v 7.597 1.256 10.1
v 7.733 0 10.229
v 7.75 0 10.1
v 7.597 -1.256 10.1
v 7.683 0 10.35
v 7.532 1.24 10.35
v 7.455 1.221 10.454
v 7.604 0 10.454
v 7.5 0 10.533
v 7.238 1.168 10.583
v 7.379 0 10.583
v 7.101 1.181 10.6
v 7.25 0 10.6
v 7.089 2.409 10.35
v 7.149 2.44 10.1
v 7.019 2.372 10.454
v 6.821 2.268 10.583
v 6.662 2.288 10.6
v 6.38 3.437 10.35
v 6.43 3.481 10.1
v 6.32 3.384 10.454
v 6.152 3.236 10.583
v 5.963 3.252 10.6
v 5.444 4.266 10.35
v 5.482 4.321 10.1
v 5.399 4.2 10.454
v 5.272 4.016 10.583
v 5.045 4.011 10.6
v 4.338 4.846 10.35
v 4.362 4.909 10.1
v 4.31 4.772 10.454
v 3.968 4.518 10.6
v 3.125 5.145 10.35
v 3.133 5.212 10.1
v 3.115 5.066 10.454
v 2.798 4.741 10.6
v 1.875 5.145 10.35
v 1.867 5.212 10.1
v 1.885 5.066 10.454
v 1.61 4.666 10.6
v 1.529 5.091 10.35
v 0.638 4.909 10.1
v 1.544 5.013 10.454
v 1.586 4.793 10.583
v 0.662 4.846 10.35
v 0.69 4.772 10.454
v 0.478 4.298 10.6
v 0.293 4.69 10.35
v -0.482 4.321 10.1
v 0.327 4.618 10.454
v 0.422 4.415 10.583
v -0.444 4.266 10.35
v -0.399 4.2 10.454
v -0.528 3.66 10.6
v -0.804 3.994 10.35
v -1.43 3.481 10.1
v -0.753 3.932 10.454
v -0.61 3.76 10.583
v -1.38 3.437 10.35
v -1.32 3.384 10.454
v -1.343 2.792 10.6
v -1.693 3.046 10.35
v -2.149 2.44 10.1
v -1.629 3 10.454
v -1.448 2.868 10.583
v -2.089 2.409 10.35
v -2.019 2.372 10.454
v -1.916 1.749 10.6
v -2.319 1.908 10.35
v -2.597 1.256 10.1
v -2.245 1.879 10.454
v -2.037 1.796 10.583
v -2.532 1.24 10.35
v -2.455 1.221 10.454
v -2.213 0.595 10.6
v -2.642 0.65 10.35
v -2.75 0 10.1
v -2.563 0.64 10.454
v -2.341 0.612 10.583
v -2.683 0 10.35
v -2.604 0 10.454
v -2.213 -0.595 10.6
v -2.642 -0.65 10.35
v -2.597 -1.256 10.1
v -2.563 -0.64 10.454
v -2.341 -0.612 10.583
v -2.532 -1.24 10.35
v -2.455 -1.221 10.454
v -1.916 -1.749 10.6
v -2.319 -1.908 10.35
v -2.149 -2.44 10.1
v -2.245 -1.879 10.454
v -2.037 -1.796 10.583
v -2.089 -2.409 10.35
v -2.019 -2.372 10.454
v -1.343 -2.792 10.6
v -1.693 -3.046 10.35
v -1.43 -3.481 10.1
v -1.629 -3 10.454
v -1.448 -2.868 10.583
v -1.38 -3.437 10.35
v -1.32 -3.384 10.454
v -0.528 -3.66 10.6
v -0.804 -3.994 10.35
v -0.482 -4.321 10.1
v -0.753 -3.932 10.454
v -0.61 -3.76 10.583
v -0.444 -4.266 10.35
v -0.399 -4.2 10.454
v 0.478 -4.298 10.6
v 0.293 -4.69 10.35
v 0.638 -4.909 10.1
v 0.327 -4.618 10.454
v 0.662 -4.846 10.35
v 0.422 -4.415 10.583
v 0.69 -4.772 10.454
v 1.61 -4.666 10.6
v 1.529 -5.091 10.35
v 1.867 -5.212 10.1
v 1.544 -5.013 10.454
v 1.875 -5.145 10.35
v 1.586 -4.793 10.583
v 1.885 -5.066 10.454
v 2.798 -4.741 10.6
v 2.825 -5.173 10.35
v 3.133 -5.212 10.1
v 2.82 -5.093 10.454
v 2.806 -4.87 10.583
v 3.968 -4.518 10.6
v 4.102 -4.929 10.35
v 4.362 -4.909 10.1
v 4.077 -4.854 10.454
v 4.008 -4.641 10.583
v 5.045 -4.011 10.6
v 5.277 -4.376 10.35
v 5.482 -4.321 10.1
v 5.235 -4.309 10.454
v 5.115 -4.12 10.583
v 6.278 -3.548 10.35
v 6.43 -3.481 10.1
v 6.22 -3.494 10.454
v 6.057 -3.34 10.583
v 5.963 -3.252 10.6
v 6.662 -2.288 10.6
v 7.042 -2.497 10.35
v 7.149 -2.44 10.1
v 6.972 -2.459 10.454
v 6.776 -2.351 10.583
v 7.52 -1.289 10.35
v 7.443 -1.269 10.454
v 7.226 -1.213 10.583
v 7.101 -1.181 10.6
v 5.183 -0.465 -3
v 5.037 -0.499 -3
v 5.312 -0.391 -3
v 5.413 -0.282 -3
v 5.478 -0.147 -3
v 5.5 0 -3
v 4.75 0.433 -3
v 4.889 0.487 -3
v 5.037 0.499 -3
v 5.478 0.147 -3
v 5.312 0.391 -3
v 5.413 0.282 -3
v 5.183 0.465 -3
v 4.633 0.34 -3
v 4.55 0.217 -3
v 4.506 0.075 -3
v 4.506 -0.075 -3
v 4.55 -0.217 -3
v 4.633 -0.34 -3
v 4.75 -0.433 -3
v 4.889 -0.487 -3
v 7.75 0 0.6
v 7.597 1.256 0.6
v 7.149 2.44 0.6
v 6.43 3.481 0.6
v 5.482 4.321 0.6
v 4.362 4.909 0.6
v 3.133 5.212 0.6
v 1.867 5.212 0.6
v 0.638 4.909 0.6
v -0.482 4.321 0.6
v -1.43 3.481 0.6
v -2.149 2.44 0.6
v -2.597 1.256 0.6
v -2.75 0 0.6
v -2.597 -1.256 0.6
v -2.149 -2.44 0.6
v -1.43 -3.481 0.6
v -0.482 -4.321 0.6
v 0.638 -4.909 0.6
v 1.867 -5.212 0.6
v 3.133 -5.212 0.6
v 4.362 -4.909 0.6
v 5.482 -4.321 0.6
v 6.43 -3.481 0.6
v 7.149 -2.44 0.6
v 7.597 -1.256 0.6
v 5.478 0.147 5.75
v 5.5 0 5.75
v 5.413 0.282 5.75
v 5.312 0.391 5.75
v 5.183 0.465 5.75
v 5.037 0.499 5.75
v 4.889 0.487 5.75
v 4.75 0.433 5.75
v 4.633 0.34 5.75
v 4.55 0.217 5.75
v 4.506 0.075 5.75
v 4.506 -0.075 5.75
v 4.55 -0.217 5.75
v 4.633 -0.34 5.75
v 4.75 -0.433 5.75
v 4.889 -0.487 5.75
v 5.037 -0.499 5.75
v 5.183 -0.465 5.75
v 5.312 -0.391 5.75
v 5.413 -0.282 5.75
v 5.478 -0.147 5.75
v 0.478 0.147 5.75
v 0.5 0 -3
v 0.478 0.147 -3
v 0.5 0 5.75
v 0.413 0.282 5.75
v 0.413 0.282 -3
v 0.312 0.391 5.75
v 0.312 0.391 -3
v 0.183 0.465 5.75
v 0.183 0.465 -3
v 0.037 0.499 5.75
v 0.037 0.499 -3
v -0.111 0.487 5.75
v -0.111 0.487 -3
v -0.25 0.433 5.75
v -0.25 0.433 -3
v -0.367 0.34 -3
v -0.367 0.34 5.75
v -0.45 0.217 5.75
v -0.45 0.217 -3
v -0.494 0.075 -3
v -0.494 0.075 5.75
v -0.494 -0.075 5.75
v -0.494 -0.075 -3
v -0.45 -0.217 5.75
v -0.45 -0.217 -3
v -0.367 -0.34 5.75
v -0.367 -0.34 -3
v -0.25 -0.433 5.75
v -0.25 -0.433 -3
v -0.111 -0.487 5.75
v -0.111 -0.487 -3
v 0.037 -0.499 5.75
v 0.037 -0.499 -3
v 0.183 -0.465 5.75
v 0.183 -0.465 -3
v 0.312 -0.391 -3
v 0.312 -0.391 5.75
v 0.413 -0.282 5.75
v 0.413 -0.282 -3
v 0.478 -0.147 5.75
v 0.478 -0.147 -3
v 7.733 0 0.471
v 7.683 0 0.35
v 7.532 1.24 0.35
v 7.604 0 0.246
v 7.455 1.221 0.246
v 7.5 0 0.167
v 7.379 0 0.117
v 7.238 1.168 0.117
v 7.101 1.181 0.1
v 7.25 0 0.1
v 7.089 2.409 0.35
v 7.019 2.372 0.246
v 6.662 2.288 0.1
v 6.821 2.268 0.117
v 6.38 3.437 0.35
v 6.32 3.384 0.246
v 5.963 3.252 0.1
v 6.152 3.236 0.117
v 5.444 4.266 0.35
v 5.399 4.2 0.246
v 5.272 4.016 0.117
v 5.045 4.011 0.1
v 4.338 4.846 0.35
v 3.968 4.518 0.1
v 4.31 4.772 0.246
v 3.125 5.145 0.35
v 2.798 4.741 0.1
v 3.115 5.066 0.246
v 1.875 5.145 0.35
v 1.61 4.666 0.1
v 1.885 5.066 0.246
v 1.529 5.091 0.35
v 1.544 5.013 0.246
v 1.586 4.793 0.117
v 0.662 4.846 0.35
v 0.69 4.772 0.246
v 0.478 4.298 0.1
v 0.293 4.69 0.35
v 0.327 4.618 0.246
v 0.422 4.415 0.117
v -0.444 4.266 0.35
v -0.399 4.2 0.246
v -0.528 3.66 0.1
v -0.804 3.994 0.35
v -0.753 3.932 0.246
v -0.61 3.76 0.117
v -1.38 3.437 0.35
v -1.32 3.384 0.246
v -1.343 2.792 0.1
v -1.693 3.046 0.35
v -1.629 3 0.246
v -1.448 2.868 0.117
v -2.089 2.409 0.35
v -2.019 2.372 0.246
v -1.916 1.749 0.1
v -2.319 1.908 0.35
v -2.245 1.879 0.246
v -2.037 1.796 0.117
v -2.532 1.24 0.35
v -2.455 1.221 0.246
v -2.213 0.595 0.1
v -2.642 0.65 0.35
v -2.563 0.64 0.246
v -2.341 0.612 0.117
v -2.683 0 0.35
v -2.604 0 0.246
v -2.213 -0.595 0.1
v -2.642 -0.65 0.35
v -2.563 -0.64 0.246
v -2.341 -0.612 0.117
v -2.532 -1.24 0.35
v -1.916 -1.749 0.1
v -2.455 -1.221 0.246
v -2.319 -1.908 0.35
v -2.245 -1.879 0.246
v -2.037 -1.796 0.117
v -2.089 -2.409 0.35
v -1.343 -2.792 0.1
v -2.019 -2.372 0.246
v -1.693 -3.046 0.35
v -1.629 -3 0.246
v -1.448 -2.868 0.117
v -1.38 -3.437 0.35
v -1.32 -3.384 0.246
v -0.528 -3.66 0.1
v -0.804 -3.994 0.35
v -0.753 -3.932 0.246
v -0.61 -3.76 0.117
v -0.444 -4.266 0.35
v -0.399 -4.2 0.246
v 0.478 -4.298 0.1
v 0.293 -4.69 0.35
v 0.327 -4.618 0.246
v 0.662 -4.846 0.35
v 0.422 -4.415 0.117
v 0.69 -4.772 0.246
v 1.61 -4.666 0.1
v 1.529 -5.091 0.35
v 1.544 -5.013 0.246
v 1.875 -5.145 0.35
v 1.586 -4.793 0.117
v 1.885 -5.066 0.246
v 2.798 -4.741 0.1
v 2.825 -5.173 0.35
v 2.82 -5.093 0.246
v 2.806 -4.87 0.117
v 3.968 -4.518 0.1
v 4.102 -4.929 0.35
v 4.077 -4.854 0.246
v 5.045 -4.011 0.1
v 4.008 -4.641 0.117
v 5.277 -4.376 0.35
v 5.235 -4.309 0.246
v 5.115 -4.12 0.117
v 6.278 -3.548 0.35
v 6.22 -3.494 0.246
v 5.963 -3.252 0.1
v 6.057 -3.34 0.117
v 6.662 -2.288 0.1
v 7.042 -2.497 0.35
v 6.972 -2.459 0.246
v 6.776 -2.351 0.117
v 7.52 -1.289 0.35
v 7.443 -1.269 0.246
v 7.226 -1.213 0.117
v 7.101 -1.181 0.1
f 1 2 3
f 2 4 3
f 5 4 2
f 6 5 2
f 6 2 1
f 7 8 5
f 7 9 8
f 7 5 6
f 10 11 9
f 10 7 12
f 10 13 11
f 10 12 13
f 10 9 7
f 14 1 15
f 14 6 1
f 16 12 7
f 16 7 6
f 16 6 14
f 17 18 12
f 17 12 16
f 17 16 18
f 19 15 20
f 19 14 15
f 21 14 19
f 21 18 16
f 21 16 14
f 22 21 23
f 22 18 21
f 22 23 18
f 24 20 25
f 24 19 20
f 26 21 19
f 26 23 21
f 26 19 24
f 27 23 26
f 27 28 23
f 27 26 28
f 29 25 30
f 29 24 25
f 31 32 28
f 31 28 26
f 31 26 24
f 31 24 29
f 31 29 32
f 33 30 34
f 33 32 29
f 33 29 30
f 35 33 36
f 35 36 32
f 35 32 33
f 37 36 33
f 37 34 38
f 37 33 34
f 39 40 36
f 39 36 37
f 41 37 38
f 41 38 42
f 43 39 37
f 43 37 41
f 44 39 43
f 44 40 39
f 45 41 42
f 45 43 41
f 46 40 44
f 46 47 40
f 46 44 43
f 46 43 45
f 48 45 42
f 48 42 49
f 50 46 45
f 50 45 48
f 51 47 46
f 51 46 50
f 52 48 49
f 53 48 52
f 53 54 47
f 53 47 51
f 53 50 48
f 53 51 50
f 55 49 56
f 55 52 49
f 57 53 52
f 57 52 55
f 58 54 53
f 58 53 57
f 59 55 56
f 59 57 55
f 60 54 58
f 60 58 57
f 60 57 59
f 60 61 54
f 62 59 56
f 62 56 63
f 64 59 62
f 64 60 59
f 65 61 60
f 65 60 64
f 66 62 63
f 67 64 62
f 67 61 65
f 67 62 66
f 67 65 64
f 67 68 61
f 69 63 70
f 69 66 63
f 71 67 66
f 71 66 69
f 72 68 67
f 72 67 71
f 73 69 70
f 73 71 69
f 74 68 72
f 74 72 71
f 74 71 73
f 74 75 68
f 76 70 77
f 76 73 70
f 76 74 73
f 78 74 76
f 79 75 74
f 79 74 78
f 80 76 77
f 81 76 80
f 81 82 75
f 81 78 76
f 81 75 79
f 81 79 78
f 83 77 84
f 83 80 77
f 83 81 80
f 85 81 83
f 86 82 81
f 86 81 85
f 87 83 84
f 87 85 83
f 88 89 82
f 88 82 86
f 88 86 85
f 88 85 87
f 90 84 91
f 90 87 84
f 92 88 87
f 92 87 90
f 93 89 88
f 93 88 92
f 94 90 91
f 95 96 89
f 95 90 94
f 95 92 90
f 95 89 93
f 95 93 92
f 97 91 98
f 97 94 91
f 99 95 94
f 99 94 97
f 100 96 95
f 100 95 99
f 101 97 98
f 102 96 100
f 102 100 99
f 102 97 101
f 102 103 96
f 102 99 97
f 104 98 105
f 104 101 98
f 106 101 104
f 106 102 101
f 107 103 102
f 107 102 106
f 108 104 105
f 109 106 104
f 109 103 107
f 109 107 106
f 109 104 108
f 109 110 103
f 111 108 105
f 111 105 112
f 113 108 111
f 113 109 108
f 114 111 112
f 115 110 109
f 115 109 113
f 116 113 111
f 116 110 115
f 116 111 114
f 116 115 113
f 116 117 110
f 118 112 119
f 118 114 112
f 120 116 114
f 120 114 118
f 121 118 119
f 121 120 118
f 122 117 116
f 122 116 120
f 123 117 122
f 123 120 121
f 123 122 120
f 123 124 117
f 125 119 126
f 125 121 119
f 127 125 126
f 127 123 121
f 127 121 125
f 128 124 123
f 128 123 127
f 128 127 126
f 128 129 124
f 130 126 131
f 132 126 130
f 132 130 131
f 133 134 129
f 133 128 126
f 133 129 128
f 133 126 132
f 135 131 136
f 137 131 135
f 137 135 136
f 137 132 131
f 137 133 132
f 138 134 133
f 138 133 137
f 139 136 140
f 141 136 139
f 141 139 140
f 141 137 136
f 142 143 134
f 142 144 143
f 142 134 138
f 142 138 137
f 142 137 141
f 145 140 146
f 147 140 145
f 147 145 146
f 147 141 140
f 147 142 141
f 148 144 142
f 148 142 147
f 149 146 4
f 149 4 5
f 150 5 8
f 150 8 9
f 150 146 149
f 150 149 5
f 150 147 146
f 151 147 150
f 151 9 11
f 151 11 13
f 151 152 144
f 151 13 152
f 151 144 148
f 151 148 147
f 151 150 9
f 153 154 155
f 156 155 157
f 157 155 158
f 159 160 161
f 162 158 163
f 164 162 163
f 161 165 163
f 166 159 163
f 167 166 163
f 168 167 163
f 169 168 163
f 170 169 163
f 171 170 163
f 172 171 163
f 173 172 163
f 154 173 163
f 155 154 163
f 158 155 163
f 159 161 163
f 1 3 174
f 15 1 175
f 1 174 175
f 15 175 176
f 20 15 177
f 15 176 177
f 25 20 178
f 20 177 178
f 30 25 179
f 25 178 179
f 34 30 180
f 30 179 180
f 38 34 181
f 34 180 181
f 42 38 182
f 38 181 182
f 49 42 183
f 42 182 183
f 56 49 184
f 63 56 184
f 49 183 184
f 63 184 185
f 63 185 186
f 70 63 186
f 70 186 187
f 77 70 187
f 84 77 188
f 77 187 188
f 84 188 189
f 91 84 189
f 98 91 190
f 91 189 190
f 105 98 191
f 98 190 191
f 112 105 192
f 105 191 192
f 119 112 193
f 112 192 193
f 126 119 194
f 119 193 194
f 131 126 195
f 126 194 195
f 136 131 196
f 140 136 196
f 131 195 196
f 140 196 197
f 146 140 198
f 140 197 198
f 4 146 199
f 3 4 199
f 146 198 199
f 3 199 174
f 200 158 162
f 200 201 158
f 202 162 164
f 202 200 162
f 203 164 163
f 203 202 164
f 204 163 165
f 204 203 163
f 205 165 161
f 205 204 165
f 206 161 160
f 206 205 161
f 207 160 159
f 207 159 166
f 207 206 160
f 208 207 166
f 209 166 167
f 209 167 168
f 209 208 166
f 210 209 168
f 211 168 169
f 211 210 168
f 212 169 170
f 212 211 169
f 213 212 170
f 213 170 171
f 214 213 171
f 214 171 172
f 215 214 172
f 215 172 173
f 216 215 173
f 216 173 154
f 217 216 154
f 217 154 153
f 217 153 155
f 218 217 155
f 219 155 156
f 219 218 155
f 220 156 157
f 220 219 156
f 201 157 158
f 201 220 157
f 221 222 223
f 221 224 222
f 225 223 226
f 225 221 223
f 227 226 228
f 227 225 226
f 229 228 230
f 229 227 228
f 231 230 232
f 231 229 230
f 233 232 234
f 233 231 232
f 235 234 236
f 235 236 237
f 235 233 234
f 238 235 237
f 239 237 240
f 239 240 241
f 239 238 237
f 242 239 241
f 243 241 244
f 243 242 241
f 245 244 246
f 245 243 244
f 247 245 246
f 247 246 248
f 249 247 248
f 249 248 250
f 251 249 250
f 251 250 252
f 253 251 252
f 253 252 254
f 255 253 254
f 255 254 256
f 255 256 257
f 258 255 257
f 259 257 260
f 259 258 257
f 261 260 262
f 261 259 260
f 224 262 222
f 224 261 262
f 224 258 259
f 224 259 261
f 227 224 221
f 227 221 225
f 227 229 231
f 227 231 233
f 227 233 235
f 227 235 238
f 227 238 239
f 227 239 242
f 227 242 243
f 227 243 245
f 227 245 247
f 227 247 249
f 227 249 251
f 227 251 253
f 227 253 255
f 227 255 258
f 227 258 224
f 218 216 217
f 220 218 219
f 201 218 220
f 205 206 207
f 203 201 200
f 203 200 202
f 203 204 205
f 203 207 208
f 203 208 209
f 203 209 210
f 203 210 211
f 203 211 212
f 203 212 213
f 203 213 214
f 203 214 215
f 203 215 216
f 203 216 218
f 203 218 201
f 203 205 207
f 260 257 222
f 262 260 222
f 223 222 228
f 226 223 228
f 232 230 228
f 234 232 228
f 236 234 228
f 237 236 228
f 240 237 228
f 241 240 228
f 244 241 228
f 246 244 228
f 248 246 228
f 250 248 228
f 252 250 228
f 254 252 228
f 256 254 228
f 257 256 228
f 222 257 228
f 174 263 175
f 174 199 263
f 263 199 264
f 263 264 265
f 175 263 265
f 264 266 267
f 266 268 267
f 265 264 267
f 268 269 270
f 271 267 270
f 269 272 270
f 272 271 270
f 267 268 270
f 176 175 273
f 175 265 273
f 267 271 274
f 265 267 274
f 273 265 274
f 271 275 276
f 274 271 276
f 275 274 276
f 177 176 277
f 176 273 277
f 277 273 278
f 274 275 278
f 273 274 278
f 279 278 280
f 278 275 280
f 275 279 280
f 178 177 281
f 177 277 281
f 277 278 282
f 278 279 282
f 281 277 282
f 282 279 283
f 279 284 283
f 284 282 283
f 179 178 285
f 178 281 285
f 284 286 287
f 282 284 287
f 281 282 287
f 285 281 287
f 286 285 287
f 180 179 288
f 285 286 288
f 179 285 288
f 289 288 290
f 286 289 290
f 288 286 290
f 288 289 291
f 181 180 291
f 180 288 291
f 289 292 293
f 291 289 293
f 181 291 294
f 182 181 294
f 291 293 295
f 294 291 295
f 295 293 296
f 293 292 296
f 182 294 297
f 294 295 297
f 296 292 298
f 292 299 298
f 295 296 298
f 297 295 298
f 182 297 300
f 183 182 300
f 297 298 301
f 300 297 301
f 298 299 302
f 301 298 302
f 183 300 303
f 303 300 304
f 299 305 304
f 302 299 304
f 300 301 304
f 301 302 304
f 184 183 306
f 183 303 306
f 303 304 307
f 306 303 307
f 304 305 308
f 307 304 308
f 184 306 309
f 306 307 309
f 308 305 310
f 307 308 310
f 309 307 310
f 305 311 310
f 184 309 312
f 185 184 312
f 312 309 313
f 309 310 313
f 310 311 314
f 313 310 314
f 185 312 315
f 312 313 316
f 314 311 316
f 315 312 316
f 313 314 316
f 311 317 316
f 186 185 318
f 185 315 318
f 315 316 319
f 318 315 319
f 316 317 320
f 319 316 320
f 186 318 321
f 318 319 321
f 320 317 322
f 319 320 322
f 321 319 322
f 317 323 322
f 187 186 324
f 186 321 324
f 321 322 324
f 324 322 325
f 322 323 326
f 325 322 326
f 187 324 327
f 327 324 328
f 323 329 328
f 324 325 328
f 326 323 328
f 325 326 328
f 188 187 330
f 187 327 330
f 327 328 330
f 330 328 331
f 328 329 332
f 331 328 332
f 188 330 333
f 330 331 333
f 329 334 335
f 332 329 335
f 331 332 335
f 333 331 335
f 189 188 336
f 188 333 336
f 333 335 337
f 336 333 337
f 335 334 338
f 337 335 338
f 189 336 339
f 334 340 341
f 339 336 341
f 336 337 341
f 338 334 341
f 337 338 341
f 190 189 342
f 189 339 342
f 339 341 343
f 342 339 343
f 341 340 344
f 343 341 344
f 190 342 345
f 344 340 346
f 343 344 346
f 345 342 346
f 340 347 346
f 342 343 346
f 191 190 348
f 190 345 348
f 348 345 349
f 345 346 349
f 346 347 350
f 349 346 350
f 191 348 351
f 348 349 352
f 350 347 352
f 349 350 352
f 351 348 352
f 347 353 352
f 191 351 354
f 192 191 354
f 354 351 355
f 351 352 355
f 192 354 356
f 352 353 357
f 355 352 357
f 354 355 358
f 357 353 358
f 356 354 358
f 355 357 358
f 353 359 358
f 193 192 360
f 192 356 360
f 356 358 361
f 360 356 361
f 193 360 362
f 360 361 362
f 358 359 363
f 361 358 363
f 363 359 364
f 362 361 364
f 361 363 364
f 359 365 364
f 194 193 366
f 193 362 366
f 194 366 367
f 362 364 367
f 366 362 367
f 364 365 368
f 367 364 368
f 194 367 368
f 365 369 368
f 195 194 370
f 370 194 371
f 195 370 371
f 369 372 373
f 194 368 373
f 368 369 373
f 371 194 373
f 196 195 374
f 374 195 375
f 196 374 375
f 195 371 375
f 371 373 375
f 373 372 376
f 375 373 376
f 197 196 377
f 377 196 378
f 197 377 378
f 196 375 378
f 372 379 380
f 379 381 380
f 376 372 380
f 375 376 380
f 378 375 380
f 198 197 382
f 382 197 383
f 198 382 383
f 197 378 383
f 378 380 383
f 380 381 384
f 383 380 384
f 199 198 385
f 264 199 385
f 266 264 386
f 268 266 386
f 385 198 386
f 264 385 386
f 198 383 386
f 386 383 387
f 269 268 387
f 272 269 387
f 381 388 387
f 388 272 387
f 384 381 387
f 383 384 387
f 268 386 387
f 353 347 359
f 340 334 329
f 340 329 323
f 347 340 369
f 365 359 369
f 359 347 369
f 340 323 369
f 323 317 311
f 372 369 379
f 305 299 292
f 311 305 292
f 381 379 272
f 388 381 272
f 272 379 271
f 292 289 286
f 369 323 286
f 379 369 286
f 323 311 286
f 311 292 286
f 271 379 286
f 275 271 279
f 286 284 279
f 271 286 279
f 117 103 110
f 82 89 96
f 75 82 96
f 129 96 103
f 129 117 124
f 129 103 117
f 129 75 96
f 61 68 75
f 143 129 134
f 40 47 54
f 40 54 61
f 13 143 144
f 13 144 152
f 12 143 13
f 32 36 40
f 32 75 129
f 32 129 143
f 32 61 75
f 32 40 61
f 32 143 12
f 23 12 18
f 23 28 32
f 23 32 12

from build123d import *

# Parameters (mm, degrees)
SKETCH001_R       = 0.5
PAD001_DEPTH      = 5.25
PAD001_DEPTH_BACK = 3.5
SKETCH_R          = 5.25
PAD_DEPTH         = 10.5
FILLET_R          = 0.5


with BuildPart() as pad001:
    # Sketch001 → Pad001 (new body, two sides)
    with BuildSketch(Plane.XY.offset(0.5)) as pad001_sk:
        Circle(SKETCH001_R)
        with Locations((5, 0)):
            Circle(SKETCH001_R)
    extrude(amount=PAD001_DEPTH)
    extrude(pad001_sk.sketch, amount=-PAD001_DEPTH_BACK)


with BuildPart() as fillet_body:
    # Sketch → Pad (new body)
    with BuildSketch(Plane.XY.offset(0.1)):
        with Locations((2.5, 0)):
            Circle(SKETCH_R)
    extrude(amount=PAD_DEPTH)

    # Fillet
    fillet_edges = [fillet_body.edges().sort_by_distance(p)[0] for p in [
        (-2.75, 0, 0.1),
        (-2.75, 0, 10.6),
    ]]
    fillet(fillet_edges, radius=FILLET_R)


solid = Compound([pad001.part, fillet_body.part])
